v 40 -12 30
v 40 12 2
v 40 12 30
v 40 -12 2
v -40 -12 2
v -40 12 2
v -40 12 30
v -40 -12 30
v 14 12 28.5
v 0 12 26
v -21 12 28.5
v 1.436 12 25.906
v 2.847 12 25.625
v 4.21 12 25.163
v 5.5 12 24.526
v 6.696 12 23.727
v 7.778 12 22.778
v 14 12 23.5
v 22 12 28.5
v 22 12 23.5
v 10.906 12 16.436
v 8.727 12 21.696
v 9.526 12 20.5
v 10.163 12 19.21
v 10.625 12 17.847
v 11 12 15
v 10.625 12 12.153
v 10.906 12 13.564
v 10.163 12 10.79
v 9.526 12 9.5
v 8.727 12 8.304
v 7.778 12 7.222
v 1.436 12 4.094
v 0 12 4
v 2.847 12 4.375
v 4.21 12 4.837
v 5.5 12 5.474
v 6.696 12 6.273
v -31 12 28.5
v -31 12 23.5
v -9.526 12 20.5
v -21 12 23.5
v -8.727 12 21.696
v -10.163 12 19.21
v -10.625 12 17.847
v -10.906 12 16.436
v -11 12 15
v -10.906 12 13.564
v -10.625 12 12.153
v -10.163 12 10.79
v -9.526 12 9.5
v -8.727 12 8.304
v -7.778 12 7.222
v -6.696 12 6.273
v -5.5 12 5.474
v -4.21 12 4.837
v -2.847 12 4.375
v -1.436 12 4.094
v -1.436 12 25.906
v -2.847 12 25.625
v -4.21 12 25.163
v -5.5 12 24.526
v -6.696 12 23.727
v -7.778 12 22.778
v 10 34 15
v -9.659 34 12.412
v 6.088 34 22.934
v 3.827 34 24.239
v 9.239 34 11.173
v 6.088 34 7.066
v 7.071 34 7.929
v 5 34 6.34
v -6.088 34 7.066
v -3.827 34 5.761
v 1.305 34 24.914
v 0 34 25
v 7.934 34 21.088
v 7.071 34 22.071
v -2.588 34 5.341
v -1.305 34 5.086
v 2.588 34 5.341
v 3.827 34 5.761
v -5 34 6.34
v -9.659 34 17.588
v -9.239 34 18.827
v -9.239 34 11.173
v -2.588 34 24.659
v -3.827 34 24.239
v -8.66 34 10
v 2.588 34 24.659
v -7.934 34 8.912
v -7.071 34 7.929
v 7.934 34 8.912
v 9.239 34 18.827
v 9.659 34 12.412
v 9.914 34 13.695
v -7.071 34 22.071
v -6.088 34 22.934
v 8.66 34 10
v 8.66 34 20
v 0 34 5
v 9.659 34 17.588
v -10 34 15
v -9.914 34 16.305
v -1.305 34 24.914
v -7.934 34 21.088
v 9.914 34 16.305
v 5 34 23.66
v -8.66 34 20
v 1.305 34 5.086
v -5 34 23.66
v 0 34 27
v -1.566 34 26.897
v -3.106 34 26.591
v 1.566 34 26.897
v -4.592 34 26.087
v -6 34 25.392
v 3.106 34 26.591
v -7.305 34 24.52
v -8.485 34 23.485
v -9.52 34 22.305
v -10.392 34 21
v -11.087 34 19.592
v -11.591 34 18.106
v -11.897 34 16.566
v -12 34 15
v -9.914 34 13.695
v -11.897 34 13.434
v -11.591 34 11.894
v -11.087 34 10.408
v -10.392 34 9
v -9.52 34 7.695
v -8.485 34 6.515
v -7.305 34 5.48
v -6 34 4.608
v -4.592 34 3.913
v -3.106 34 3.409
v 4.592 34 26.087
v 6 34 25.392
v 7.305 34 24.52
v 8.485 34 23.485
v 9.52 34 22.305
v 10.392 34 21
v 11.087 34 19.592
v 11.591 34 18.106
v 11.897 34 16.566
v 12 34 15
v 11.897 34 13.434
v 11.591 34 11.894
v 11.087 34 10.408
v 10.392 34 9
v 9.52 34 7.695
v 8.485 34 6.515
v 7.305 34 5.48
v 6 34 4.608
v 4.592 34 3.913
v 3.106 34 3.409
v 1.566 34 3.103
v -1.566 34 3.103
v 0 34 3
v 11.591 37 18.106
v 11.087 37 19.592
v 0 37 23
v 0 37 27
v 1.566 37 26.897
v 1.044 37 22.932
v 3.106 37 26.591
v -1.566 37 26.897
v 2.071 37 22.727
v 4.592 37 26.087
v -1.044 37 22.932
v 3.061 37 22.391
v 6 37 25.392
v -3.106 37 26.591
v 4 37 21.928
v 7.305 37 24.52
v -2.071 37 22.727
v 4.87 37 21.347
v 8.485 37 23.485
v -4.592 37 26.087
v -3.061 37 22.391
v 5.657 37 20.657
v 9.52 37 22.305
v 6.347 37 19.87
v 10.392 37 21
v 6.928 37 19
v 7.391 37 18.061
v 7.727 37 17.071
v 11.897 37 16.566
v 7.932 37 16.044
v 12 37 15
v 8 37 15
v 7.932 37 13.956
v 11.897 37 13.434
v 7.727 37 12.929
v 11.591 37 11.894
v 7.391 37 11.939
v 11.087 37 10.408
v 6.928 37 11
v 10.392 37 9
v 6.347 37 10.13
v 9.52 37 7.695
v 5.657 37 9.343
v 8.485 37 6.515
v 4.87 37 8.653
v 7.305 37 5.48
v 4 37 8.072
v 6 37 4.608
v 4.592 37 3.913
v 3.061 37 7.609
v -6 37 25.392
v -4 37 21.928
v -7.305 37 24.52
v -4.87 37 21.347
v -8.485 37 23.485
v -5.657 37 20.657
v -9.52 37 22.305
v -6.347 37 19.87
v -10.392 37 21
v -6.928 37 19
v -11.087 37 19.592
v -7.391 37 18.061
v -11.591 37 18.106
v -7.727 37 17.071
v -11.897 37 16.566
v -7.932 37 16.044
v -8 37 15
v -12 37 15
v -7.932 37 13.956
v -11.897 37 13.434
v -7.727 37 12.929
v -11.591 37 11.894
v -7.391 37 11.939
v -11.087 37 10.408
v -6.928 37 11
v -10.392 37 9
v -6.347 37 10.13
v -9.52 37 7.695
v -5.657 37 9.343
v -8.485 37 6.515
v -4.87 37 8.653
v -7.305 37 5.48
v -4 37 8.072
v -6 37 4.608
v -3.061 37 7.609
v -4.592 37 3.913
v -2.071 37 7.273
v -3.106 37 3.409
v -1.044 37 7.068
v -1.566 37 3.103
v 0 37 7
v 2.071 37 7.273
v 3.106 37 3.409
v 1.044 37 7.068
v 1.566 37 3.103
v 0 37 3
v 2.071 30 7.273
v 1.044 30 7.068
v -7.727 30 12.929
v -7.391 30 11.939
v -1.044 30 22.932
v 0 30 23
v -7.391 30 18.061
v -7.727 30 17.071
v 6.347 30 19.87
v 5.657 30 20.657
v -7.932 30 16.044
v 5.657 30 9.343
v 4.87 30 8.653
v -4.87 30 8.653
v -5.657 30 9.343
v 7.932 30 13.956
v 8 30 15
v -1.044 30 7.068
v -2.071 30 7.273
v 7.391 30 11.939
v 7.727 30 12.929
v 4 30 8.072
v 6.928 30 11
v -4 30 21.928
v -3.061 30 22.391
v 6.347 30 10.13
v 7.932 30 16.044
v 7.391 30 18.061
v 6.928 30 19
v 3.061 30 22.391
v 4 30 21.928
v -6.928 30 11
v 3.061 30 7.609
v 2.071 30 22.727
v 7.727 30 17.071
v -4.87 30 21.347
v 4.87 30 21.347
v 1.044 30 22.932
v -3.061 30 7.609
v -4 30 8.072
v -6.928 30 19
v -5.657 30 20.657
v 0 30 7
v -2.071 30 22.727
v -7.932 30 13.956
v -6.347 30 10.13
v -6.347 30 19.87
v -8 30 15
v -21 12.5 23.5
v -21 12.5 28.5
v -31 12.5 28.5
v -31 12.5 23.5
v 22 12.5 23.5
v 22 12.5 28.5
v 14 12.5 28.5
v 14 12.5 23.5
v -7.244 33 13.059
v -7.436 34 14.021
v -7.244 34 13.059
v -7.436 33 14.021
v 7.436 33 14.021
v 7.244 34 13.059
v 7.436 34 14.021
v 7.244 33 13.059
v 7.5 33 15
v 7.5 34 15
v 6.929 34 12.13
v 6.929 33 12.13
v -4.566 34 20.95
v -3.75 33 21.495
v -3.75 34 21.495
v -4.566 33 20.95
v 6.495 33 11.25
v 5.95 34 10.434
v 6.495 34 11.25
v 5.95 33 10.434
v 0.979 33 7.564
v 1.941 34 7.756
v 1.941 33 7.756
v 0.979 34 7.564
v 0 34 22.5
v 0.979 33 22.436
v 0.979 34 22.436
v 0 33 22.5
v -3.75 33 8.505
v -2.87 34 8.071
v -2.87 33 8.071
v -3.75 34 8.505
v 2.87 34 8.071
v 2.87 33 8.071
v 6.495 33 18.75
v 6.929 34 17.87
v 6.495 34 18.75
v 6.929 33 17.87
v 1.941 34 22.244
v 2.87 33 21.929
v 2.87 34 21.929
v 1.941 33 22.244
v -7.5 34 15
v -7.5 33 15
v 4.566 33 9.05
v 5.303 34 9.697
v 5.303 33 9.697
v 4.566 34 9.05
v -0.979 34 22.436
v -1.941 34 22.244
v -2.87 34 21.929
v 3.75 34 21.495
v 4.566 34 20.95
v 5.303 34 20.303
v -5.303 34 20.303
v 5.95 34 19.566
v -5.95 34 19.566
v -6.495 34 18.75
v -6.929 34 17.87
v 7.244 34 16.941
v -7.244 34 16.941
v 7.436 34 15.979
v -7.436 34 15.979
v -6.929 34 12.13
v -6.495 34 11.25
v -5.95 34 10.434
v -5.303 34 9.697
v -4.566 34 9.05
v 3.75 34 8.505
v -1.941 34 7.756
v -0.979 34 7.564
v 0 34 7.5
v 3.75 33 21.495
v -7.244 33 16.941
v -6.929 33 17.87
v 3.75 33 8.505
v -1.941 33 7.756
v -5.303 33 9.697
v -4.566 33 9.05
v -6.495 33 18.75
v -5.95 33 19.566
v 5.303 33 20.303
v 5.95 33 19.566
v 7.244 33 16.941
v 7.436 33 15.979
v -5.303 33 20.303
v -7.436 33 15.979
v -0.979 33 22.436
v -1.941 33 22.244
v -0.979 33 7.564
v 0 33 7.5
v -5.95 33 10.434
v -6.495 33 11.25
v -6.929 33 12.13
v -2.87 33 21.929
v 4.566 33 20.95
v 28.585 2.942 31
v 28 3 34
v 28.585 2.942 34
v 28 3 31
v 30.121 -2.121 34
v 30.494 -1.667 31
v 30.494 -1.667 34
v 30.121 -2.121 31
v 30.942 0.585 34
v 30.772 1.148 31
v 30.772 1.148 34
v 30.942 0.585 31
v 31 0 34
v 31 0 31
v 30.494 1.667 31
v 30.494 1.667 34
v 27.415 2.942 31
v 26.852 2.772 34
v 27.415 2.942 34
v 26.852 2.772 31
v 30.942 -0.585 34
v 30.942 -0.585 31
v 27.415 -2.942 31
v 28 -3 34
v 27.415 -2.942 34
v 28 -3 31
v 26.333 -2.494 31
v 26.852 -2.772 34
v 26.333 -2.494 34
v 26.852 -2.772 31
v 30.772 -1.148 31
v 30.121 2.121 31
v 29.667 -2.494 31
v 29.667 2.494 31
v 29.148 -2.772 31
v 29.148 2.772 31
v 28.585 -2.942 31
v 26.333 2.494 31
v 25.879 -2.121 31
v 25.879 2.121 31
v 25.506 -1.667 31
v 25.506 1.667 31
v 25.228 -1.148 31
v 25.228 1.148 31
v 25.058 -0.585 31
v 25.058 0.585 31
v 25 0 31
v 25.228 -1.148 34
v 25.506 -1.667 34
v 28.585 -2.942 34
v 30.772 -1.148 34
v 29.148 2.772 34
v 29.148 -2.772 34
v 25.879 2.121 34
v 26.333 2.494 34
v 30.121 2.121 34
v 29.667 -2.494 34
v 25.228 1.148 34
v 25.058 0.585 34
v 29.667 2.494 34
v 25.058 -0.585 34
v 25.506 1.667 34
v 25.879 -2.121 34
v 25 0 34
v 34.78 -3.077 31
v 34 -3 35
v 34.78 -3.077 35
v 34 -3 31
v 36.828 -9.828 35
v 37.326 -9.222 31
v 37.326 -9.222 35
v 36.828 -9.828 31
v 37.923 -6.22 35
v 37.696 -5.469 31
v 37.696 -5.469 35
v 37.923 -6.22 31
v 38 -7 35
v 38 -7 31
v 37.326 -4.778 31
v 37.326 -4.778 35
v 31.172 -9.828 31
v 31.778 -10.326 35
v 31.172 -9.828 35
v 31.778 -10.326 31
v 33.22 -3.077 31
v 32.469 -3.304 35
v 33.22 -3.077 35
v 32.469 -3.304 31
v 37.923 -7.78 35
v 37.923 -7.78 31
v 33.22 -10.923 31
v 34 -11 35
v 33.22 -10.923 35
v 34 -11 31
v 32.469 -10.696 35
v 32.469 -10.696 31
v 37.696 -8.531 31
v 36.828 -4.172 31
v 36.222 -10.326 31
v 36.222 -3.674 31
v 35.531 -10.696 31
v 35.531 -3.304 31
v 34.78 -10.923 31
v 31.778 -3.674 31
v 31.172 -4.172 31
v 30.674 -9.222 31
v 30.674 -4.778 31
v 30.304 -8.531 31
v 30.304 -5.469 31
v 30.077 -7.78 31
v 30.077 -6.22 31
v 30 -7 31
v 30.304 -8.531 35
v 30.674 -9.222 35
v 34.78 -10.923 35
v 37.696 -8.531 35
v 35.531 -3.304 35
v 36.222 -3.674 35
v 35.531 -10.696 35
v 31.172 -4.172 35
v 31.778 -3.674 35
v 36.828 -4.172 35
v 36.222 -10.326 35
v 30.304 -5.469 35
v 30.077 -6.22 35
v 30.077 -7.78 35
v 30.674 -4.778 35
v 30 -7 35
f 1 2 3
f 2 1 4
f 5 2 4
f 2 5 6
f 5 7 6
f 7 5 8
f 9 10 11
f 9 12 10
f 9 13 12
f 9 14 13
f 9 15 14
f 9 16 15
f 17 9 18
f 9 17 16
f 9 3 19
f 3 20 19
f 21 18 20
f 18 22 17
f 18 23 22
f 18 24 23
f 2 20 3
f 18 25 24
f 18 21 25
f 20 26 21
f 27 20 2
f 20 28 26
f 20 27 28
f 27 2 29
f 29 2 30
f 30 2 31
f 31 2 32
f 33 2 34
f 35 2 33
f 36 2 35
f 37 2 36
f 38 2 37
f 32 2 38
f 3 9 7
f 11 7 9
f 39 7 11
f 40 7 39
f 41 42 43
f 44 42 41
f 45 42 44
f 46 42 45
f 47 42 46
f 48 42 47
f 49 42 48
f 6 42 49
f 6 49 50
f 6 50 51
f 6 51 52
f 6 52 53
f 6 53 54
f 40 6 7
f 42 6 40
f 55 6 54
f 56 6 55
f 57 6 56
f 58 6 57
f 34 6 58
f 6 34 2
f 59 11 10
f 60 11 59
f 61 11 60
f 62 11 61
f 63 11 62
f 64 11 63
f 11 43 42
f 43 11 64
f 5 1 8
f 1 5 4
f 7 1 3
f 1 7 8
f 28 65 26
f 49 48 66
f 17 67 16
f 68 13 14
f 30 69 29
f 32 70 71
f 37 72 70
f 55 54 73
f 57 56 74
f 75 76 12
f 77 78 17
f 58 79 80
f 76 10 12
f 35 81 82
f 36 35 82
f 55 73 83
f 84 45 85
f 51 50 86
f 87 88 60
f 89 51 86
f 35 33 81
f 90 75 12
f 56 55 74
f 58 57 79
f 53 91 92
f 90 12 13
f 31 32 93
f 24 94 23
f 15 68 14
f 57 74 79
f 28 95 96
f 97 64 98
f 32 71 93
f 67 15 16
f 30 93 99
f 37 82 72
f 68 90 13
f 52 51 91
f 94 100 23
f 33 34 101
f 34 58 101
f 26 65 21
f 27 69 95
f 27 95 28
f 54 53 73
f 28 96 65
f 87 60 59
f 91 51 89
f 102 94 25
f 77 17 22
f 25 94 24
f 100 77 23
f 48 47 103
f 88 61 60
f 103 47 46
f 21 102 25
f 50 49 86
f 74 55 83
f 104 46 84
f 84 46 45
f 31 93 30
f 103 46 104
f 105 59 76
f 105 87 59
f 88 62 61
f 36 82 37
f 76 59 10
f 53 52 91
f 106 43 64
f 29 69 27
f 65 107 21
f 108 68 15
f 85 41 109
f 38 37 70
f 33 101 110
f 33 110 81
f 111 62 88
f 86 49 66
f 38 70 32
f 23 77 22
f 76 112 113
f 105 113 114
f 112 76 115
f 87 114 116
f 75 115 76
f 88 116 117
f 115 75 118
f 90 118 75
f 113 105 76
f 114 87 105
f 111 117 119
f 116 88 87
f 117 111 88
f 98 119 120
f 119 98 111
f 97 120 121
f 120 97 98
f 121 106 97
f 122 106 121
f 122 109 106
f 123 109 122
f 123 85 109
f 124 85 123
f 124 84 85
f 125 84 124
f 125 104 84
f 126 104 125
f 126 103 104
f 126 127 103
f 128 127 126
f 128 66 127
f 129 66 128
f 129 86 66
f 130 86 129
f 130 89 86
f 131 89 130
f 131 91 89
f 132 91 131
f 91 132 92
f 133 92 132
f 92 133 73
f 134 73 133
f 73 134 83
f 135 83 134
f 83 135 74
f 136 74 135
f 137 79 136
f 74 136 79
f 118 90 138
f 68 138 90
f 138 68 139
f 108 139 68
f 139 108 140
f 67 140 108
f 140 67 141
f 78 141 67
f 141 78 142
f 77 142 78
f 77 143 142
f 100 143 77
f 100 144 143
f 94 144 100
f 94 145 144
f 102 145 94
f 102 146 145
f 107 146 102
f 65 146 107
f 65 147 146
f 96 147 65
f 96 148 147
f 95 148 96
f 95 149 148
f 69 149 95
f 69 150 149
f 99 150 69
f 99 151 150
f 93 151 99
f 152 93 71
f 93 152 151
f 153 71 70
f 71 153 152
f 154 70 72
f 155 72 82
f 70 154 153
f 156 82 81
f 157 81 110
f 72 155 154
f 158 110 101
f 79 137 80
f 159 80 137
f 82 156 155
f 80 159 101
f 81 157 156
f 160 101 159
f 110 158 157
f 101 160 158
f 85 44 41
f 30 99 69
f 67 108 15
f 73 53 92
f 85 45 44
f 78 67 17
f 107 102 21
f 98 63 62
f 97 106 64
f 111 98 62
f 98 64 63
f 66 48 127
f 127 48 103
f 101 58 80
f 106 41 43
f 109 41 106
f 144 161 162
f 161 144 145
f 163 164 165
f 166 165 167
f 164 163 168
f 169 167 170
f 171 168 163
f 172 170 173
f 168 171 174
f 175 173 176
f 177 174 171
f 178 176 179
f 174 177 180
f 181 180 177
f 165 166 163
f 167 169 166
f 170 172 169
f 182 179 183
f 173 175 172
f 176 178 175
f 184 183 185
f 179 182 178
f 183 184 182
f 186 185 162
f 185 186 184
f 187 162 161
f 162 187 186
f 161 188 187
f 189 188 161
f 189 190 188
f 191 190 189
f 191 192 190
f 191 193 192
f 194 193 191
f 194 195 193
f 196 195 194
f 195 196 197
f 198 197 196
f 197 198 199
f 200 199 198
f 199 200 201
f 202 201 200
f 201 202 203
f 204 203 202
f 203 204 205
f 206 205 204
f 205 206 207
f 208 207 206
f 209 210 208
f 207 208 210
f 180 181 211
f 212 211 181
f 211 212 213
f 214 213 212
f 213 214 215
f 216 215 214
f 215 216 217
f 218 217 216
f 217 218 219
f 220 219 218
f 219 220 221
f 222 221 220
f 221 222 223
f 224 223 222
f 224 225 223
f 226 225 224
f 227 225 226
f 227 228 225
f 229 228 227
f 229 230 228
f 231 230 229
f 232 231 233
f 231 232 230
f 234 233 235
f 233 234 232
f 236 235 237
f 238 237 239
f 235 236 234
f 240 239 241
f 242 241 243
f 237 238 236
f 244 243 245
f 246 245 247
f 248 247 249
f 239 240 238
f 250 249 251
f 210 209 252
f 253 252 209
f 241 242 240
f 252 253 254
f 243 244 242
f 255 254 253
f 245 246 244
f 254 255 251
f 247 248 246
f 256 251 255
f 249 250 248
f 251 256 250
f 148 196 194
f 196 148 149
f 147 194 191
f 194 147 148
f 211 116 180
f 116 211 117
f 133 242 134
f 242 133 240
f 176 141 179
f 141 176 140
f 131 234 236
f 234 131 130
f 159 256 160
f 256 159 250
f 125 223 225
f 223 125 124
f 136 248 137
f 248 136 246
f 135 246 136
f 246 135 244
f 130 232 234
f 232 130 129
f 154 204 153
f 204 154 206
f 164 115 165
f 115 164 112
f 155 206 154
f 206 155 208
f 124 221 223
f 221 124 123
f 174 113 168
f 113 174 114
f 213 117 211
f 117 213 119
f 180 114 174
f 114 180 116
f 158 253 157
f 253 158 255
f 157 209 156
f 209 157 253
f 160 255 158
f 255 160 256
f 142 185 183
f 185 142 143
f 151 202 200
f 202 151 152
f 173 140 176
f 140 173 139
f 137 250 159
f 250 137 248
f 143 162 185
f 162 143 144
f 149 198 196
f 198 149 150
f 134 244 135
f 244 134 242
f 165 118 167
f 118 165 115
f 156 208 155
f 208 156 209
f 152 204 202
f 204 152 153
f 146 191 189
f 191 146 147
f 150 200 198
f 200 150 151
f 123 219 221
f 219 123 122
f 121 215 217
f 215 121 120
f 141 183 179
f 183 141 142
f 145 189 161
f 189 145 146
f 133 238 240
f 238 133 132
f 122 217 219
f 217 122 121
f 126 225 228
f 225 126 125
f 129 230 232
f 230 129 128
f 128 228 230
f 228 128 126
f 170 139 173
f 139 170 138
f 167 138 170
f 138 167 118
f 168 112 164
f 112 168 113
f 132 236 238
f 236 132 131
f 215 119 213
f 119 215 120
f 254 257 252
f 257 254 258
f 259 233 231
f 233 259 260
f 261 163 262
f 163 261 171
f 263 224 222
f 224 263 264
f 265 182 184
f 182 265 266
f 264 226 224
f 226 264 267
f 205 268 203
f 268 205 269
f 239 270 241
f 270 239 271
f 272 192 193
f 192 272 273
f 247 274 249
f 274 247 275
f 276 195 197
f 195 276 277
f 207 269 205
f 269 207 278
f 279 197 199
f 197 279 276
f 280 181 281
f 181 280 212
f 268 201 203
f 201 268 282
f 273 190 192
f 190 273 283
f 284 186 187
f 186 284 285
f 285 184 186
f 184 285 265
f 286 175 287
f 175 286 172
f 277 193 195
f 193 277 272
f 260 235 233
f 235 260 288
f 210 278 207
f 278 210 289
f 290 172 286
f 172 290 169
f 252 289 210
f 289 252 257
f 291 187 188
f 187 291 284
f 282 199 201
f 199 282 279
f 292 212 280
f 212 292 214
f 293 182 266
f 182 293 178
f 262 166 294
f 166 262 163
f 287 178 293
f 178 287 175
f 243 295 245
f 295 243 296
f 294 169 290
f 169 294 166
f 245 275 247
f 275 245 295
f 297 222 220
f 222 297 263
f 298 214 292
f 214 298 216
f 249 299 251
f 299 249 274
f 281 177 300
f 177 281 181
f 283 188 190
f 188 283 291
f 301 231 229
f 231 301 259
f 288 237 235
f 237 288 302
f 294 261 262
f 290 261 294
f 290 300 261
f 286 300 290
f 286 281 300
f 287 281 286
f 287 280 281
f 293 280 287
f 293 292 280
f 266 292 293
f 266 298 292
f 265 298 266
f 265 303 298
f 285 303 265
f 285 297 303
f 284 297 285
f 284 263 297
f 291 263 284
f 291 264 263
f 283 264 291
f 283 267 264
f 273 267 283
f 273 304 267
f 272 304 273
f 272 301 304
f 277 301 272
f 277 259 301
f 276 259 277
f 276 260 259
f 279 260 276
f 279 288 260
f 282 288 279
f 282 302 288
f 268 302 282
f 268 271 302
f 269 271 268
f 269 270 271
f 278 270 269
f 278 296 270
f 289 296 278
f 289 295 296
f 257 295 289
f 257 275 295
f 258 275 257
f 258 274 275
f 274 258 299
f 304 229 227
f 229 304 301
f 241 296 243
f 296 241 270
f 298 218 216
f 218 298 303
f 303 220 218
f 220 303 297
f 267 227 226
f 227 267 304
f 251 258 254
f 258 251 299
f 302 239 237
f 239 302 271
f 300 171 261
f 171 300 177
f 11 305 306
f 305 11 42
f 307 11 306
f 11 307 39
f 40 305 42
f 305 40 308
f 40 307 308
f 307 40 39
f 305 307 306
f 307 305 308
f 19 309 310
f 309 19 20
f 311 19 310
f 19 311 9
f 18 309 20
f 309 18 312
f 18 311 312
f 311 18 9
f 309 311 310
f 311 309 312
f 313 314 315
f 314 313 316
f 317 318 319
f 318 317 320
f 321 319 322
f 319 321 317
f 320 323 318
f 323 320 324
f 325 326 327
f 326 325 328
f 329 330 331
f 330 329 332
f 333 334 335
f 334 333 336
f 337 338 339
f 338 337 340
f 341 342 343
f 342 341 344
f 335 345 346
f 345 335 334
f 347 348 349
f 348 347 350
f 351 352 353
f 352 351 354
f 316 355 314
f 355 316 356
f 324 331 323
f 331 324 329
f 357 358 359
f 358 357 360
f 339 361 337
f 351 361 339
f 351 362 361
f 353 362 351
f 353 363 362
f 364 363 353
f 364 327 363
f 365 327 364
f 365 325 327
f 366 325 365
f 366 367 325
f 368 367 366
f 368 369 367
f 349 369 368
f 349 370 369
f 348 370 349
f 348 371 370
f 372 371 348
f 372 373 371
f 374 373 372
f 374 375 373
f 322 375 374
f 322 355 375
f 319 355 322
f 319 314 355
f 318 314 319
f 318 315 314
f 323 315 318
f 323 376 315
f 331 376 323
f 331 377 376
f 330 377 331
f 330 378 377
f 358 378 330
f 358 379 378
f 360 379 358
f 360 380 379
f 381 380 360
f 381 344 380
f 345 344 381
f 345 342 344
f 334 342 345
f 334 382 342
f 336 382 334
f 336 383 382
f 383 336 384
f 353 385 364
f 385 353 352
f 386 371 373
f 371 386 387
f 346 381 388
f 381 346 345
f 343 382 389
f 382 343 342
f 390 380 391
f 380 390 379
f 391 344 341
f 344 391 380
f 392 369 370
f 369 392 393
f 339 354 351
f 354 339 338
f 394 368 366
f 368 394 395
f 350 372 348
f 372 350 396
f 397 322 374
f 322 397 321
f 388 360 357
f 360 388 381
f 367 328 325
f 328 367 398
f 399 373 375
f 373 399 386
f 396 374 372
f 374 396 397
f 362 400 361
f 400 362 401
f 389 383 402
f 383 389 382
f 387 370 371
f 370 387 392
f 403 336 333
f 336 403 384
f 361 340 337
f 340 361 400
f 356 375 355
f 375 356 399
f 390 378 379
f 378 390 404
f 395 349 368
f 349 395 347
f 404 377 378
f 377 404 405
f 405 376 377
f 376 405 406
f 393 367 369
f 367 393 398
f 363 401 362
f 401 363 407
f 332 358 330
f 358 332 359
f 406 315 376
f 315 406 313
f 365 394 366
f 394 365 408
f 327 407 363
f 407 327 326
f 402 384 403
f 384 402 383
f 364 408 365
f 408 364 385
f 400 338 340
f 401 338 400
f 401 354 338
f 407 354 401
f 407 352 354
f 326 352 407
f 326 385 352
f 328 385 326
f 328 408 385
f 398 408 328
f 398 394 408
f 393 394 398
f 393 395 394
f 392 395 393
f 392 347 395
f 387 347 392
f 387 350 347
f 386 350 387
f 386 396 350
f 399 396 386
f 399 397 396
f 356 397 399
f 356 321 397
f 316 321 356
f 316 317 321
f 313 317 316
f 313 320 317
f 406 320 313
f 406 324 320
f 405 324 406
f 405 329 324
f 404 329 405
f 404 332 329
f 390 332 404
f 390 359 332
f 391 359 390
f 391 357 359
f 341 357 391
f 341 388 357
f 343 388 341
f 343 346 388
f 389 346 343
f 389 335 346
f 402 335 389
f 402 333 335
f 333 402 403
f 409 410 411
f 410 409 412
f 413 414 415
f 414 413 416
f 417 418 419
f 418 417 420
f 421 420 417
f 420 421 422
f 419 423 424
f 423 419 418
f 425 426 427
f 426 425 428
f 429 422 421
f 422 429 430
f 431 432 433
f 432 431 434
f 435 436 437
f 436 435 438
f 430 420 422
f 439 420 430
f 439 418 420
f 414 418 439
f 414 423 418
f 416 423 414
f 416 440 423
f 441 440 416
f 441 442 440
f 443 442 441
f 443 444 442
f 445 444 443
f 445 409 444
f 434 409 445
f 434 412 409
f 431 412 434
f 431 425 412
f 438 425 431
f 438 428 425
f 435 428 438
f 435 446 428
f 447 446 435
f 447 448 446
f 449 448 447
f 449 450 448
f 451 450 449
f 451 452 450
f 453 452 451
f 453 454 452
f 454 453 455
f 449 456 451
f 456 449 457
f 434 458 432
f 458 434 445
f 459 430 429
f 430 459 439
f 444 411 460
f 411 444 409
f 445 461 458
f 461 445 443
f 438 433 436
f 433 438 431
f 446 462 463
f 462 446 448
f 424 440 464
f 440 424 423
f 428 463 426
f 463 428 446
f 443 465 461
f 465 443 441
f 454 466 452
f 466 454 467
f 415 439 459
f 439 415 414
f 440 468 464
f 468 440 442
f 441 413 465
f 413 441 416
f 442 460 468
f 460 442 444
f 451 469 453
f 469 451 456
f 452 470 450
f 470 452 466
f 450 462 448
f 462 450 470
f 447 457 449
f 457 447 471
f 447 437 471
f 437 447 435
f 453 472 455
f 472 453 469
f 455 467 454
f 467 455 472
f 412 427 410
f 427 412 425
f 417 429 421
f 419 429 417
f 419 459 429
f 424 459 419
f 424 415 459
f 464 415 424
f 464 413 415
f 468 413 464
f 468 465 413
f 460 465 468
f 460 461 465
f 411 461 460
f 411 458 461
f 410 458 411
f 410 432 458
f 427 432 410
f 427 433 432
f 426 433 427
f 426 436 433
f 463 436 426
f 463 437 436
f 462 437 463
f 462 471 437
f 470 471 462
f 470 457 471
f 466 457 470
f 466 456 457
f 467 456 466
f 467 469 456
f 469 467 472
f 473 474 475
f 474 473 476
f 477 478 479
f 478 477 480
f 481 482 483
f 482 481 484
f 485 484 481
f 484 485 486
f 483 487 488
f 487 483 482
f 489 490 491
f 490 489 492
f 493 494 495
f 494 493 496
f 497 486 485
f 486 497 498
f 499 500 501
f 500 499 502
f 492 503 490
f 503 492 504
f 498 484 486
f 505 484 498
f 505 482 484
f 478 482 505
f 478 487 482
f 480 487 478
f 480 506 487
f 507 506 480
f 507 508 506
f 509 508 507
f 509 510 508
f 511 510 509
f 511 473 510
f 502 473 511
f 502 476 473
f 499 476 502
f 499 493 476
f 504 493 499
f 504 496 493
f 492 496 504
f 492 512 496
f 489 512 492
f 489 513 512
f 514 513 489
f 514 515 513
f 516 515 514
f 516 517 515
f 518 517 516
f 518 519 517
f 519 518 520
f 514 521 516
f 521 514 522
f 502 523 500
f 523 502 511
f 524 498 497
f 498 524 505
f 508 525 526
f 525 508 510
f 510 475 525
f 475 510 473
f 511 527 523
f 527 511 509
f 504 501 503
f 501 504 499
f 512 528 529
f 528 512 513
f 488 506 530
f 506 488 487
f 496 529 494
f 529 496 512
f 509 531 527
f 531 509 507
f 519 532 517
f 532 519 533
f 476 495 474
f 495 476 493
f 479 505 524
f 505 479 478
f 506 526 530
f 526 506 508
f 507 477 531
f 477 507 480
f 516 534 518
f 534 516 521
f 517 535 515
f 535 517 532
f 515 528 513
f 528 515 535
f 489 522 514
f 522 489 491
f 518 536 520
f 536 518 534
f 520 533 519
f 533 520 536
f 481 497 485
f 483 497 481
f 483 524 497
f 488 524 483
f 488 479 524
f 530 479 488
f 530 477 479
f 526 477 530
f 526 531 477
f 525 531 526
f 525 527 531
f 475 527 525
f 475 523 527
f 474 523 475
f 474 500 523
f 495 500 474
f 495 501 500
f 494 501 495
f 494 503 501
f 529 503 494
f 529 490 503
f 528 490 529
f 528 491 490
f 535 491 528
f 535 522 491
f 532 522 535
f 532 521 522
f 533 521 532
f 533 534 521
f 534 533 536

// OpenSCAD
module label(name) { children(); }

// Camera body: a rounded box that includes the top plate cap
label("body") union() {
  translate([-40, -12,  2]) cube([80, 24, 26]);
  translate([0, 0, 28]) cube([80, 24, 4], true);
}

// Lens barrel (front of camera) -- pointing +Y, mounted on body front
label("lens")
  translate([0, 12, 15])
    rotate([-90, 0, 0])
      difference() {
        union() {
          cylinder(h = 22, r1 = 11, r2 = 10, $fn = 48);
          translate([0, 0, 22]) cylinder(h = 3, r = 12, $fn = 48);
          translate([0, 0, -2]) cylinder(h = 2, r = 12, $fn = 48);
        }
        translate([0, 0, 18]) cylinder(h = 8, r = 8, $fn = 48);
      }

// Front glass element (dark, recessed inside the lens barrel)
label("glass")
  translate([0, 33, 15])
    rotate([-90, 0, 0])
      cylinder(h = 1, r = 7.5, $fn = 48);

// Shutter release button on the top plate
label("shutter")
  translate([28, 0, 31]) cylinder(h = 3, r = 3, $fn = 32);

// Rangefinder / viewfinder windows -- two small rectangles set into the front
label("viewfinder") union() {
  // main viewfinder window
  translate([-26, 11.5, 26]) cube([10, 2, 5], true);
  // rangefinder window
  translate([18, 11.5, 26]) cube([8, 2, 5], true);
}

// Wind lever knob on the right side of the top plate
label("wind")
  translate([34, -7, 31])
    cylinder(h = 4, r = 4, $fn = 32);
